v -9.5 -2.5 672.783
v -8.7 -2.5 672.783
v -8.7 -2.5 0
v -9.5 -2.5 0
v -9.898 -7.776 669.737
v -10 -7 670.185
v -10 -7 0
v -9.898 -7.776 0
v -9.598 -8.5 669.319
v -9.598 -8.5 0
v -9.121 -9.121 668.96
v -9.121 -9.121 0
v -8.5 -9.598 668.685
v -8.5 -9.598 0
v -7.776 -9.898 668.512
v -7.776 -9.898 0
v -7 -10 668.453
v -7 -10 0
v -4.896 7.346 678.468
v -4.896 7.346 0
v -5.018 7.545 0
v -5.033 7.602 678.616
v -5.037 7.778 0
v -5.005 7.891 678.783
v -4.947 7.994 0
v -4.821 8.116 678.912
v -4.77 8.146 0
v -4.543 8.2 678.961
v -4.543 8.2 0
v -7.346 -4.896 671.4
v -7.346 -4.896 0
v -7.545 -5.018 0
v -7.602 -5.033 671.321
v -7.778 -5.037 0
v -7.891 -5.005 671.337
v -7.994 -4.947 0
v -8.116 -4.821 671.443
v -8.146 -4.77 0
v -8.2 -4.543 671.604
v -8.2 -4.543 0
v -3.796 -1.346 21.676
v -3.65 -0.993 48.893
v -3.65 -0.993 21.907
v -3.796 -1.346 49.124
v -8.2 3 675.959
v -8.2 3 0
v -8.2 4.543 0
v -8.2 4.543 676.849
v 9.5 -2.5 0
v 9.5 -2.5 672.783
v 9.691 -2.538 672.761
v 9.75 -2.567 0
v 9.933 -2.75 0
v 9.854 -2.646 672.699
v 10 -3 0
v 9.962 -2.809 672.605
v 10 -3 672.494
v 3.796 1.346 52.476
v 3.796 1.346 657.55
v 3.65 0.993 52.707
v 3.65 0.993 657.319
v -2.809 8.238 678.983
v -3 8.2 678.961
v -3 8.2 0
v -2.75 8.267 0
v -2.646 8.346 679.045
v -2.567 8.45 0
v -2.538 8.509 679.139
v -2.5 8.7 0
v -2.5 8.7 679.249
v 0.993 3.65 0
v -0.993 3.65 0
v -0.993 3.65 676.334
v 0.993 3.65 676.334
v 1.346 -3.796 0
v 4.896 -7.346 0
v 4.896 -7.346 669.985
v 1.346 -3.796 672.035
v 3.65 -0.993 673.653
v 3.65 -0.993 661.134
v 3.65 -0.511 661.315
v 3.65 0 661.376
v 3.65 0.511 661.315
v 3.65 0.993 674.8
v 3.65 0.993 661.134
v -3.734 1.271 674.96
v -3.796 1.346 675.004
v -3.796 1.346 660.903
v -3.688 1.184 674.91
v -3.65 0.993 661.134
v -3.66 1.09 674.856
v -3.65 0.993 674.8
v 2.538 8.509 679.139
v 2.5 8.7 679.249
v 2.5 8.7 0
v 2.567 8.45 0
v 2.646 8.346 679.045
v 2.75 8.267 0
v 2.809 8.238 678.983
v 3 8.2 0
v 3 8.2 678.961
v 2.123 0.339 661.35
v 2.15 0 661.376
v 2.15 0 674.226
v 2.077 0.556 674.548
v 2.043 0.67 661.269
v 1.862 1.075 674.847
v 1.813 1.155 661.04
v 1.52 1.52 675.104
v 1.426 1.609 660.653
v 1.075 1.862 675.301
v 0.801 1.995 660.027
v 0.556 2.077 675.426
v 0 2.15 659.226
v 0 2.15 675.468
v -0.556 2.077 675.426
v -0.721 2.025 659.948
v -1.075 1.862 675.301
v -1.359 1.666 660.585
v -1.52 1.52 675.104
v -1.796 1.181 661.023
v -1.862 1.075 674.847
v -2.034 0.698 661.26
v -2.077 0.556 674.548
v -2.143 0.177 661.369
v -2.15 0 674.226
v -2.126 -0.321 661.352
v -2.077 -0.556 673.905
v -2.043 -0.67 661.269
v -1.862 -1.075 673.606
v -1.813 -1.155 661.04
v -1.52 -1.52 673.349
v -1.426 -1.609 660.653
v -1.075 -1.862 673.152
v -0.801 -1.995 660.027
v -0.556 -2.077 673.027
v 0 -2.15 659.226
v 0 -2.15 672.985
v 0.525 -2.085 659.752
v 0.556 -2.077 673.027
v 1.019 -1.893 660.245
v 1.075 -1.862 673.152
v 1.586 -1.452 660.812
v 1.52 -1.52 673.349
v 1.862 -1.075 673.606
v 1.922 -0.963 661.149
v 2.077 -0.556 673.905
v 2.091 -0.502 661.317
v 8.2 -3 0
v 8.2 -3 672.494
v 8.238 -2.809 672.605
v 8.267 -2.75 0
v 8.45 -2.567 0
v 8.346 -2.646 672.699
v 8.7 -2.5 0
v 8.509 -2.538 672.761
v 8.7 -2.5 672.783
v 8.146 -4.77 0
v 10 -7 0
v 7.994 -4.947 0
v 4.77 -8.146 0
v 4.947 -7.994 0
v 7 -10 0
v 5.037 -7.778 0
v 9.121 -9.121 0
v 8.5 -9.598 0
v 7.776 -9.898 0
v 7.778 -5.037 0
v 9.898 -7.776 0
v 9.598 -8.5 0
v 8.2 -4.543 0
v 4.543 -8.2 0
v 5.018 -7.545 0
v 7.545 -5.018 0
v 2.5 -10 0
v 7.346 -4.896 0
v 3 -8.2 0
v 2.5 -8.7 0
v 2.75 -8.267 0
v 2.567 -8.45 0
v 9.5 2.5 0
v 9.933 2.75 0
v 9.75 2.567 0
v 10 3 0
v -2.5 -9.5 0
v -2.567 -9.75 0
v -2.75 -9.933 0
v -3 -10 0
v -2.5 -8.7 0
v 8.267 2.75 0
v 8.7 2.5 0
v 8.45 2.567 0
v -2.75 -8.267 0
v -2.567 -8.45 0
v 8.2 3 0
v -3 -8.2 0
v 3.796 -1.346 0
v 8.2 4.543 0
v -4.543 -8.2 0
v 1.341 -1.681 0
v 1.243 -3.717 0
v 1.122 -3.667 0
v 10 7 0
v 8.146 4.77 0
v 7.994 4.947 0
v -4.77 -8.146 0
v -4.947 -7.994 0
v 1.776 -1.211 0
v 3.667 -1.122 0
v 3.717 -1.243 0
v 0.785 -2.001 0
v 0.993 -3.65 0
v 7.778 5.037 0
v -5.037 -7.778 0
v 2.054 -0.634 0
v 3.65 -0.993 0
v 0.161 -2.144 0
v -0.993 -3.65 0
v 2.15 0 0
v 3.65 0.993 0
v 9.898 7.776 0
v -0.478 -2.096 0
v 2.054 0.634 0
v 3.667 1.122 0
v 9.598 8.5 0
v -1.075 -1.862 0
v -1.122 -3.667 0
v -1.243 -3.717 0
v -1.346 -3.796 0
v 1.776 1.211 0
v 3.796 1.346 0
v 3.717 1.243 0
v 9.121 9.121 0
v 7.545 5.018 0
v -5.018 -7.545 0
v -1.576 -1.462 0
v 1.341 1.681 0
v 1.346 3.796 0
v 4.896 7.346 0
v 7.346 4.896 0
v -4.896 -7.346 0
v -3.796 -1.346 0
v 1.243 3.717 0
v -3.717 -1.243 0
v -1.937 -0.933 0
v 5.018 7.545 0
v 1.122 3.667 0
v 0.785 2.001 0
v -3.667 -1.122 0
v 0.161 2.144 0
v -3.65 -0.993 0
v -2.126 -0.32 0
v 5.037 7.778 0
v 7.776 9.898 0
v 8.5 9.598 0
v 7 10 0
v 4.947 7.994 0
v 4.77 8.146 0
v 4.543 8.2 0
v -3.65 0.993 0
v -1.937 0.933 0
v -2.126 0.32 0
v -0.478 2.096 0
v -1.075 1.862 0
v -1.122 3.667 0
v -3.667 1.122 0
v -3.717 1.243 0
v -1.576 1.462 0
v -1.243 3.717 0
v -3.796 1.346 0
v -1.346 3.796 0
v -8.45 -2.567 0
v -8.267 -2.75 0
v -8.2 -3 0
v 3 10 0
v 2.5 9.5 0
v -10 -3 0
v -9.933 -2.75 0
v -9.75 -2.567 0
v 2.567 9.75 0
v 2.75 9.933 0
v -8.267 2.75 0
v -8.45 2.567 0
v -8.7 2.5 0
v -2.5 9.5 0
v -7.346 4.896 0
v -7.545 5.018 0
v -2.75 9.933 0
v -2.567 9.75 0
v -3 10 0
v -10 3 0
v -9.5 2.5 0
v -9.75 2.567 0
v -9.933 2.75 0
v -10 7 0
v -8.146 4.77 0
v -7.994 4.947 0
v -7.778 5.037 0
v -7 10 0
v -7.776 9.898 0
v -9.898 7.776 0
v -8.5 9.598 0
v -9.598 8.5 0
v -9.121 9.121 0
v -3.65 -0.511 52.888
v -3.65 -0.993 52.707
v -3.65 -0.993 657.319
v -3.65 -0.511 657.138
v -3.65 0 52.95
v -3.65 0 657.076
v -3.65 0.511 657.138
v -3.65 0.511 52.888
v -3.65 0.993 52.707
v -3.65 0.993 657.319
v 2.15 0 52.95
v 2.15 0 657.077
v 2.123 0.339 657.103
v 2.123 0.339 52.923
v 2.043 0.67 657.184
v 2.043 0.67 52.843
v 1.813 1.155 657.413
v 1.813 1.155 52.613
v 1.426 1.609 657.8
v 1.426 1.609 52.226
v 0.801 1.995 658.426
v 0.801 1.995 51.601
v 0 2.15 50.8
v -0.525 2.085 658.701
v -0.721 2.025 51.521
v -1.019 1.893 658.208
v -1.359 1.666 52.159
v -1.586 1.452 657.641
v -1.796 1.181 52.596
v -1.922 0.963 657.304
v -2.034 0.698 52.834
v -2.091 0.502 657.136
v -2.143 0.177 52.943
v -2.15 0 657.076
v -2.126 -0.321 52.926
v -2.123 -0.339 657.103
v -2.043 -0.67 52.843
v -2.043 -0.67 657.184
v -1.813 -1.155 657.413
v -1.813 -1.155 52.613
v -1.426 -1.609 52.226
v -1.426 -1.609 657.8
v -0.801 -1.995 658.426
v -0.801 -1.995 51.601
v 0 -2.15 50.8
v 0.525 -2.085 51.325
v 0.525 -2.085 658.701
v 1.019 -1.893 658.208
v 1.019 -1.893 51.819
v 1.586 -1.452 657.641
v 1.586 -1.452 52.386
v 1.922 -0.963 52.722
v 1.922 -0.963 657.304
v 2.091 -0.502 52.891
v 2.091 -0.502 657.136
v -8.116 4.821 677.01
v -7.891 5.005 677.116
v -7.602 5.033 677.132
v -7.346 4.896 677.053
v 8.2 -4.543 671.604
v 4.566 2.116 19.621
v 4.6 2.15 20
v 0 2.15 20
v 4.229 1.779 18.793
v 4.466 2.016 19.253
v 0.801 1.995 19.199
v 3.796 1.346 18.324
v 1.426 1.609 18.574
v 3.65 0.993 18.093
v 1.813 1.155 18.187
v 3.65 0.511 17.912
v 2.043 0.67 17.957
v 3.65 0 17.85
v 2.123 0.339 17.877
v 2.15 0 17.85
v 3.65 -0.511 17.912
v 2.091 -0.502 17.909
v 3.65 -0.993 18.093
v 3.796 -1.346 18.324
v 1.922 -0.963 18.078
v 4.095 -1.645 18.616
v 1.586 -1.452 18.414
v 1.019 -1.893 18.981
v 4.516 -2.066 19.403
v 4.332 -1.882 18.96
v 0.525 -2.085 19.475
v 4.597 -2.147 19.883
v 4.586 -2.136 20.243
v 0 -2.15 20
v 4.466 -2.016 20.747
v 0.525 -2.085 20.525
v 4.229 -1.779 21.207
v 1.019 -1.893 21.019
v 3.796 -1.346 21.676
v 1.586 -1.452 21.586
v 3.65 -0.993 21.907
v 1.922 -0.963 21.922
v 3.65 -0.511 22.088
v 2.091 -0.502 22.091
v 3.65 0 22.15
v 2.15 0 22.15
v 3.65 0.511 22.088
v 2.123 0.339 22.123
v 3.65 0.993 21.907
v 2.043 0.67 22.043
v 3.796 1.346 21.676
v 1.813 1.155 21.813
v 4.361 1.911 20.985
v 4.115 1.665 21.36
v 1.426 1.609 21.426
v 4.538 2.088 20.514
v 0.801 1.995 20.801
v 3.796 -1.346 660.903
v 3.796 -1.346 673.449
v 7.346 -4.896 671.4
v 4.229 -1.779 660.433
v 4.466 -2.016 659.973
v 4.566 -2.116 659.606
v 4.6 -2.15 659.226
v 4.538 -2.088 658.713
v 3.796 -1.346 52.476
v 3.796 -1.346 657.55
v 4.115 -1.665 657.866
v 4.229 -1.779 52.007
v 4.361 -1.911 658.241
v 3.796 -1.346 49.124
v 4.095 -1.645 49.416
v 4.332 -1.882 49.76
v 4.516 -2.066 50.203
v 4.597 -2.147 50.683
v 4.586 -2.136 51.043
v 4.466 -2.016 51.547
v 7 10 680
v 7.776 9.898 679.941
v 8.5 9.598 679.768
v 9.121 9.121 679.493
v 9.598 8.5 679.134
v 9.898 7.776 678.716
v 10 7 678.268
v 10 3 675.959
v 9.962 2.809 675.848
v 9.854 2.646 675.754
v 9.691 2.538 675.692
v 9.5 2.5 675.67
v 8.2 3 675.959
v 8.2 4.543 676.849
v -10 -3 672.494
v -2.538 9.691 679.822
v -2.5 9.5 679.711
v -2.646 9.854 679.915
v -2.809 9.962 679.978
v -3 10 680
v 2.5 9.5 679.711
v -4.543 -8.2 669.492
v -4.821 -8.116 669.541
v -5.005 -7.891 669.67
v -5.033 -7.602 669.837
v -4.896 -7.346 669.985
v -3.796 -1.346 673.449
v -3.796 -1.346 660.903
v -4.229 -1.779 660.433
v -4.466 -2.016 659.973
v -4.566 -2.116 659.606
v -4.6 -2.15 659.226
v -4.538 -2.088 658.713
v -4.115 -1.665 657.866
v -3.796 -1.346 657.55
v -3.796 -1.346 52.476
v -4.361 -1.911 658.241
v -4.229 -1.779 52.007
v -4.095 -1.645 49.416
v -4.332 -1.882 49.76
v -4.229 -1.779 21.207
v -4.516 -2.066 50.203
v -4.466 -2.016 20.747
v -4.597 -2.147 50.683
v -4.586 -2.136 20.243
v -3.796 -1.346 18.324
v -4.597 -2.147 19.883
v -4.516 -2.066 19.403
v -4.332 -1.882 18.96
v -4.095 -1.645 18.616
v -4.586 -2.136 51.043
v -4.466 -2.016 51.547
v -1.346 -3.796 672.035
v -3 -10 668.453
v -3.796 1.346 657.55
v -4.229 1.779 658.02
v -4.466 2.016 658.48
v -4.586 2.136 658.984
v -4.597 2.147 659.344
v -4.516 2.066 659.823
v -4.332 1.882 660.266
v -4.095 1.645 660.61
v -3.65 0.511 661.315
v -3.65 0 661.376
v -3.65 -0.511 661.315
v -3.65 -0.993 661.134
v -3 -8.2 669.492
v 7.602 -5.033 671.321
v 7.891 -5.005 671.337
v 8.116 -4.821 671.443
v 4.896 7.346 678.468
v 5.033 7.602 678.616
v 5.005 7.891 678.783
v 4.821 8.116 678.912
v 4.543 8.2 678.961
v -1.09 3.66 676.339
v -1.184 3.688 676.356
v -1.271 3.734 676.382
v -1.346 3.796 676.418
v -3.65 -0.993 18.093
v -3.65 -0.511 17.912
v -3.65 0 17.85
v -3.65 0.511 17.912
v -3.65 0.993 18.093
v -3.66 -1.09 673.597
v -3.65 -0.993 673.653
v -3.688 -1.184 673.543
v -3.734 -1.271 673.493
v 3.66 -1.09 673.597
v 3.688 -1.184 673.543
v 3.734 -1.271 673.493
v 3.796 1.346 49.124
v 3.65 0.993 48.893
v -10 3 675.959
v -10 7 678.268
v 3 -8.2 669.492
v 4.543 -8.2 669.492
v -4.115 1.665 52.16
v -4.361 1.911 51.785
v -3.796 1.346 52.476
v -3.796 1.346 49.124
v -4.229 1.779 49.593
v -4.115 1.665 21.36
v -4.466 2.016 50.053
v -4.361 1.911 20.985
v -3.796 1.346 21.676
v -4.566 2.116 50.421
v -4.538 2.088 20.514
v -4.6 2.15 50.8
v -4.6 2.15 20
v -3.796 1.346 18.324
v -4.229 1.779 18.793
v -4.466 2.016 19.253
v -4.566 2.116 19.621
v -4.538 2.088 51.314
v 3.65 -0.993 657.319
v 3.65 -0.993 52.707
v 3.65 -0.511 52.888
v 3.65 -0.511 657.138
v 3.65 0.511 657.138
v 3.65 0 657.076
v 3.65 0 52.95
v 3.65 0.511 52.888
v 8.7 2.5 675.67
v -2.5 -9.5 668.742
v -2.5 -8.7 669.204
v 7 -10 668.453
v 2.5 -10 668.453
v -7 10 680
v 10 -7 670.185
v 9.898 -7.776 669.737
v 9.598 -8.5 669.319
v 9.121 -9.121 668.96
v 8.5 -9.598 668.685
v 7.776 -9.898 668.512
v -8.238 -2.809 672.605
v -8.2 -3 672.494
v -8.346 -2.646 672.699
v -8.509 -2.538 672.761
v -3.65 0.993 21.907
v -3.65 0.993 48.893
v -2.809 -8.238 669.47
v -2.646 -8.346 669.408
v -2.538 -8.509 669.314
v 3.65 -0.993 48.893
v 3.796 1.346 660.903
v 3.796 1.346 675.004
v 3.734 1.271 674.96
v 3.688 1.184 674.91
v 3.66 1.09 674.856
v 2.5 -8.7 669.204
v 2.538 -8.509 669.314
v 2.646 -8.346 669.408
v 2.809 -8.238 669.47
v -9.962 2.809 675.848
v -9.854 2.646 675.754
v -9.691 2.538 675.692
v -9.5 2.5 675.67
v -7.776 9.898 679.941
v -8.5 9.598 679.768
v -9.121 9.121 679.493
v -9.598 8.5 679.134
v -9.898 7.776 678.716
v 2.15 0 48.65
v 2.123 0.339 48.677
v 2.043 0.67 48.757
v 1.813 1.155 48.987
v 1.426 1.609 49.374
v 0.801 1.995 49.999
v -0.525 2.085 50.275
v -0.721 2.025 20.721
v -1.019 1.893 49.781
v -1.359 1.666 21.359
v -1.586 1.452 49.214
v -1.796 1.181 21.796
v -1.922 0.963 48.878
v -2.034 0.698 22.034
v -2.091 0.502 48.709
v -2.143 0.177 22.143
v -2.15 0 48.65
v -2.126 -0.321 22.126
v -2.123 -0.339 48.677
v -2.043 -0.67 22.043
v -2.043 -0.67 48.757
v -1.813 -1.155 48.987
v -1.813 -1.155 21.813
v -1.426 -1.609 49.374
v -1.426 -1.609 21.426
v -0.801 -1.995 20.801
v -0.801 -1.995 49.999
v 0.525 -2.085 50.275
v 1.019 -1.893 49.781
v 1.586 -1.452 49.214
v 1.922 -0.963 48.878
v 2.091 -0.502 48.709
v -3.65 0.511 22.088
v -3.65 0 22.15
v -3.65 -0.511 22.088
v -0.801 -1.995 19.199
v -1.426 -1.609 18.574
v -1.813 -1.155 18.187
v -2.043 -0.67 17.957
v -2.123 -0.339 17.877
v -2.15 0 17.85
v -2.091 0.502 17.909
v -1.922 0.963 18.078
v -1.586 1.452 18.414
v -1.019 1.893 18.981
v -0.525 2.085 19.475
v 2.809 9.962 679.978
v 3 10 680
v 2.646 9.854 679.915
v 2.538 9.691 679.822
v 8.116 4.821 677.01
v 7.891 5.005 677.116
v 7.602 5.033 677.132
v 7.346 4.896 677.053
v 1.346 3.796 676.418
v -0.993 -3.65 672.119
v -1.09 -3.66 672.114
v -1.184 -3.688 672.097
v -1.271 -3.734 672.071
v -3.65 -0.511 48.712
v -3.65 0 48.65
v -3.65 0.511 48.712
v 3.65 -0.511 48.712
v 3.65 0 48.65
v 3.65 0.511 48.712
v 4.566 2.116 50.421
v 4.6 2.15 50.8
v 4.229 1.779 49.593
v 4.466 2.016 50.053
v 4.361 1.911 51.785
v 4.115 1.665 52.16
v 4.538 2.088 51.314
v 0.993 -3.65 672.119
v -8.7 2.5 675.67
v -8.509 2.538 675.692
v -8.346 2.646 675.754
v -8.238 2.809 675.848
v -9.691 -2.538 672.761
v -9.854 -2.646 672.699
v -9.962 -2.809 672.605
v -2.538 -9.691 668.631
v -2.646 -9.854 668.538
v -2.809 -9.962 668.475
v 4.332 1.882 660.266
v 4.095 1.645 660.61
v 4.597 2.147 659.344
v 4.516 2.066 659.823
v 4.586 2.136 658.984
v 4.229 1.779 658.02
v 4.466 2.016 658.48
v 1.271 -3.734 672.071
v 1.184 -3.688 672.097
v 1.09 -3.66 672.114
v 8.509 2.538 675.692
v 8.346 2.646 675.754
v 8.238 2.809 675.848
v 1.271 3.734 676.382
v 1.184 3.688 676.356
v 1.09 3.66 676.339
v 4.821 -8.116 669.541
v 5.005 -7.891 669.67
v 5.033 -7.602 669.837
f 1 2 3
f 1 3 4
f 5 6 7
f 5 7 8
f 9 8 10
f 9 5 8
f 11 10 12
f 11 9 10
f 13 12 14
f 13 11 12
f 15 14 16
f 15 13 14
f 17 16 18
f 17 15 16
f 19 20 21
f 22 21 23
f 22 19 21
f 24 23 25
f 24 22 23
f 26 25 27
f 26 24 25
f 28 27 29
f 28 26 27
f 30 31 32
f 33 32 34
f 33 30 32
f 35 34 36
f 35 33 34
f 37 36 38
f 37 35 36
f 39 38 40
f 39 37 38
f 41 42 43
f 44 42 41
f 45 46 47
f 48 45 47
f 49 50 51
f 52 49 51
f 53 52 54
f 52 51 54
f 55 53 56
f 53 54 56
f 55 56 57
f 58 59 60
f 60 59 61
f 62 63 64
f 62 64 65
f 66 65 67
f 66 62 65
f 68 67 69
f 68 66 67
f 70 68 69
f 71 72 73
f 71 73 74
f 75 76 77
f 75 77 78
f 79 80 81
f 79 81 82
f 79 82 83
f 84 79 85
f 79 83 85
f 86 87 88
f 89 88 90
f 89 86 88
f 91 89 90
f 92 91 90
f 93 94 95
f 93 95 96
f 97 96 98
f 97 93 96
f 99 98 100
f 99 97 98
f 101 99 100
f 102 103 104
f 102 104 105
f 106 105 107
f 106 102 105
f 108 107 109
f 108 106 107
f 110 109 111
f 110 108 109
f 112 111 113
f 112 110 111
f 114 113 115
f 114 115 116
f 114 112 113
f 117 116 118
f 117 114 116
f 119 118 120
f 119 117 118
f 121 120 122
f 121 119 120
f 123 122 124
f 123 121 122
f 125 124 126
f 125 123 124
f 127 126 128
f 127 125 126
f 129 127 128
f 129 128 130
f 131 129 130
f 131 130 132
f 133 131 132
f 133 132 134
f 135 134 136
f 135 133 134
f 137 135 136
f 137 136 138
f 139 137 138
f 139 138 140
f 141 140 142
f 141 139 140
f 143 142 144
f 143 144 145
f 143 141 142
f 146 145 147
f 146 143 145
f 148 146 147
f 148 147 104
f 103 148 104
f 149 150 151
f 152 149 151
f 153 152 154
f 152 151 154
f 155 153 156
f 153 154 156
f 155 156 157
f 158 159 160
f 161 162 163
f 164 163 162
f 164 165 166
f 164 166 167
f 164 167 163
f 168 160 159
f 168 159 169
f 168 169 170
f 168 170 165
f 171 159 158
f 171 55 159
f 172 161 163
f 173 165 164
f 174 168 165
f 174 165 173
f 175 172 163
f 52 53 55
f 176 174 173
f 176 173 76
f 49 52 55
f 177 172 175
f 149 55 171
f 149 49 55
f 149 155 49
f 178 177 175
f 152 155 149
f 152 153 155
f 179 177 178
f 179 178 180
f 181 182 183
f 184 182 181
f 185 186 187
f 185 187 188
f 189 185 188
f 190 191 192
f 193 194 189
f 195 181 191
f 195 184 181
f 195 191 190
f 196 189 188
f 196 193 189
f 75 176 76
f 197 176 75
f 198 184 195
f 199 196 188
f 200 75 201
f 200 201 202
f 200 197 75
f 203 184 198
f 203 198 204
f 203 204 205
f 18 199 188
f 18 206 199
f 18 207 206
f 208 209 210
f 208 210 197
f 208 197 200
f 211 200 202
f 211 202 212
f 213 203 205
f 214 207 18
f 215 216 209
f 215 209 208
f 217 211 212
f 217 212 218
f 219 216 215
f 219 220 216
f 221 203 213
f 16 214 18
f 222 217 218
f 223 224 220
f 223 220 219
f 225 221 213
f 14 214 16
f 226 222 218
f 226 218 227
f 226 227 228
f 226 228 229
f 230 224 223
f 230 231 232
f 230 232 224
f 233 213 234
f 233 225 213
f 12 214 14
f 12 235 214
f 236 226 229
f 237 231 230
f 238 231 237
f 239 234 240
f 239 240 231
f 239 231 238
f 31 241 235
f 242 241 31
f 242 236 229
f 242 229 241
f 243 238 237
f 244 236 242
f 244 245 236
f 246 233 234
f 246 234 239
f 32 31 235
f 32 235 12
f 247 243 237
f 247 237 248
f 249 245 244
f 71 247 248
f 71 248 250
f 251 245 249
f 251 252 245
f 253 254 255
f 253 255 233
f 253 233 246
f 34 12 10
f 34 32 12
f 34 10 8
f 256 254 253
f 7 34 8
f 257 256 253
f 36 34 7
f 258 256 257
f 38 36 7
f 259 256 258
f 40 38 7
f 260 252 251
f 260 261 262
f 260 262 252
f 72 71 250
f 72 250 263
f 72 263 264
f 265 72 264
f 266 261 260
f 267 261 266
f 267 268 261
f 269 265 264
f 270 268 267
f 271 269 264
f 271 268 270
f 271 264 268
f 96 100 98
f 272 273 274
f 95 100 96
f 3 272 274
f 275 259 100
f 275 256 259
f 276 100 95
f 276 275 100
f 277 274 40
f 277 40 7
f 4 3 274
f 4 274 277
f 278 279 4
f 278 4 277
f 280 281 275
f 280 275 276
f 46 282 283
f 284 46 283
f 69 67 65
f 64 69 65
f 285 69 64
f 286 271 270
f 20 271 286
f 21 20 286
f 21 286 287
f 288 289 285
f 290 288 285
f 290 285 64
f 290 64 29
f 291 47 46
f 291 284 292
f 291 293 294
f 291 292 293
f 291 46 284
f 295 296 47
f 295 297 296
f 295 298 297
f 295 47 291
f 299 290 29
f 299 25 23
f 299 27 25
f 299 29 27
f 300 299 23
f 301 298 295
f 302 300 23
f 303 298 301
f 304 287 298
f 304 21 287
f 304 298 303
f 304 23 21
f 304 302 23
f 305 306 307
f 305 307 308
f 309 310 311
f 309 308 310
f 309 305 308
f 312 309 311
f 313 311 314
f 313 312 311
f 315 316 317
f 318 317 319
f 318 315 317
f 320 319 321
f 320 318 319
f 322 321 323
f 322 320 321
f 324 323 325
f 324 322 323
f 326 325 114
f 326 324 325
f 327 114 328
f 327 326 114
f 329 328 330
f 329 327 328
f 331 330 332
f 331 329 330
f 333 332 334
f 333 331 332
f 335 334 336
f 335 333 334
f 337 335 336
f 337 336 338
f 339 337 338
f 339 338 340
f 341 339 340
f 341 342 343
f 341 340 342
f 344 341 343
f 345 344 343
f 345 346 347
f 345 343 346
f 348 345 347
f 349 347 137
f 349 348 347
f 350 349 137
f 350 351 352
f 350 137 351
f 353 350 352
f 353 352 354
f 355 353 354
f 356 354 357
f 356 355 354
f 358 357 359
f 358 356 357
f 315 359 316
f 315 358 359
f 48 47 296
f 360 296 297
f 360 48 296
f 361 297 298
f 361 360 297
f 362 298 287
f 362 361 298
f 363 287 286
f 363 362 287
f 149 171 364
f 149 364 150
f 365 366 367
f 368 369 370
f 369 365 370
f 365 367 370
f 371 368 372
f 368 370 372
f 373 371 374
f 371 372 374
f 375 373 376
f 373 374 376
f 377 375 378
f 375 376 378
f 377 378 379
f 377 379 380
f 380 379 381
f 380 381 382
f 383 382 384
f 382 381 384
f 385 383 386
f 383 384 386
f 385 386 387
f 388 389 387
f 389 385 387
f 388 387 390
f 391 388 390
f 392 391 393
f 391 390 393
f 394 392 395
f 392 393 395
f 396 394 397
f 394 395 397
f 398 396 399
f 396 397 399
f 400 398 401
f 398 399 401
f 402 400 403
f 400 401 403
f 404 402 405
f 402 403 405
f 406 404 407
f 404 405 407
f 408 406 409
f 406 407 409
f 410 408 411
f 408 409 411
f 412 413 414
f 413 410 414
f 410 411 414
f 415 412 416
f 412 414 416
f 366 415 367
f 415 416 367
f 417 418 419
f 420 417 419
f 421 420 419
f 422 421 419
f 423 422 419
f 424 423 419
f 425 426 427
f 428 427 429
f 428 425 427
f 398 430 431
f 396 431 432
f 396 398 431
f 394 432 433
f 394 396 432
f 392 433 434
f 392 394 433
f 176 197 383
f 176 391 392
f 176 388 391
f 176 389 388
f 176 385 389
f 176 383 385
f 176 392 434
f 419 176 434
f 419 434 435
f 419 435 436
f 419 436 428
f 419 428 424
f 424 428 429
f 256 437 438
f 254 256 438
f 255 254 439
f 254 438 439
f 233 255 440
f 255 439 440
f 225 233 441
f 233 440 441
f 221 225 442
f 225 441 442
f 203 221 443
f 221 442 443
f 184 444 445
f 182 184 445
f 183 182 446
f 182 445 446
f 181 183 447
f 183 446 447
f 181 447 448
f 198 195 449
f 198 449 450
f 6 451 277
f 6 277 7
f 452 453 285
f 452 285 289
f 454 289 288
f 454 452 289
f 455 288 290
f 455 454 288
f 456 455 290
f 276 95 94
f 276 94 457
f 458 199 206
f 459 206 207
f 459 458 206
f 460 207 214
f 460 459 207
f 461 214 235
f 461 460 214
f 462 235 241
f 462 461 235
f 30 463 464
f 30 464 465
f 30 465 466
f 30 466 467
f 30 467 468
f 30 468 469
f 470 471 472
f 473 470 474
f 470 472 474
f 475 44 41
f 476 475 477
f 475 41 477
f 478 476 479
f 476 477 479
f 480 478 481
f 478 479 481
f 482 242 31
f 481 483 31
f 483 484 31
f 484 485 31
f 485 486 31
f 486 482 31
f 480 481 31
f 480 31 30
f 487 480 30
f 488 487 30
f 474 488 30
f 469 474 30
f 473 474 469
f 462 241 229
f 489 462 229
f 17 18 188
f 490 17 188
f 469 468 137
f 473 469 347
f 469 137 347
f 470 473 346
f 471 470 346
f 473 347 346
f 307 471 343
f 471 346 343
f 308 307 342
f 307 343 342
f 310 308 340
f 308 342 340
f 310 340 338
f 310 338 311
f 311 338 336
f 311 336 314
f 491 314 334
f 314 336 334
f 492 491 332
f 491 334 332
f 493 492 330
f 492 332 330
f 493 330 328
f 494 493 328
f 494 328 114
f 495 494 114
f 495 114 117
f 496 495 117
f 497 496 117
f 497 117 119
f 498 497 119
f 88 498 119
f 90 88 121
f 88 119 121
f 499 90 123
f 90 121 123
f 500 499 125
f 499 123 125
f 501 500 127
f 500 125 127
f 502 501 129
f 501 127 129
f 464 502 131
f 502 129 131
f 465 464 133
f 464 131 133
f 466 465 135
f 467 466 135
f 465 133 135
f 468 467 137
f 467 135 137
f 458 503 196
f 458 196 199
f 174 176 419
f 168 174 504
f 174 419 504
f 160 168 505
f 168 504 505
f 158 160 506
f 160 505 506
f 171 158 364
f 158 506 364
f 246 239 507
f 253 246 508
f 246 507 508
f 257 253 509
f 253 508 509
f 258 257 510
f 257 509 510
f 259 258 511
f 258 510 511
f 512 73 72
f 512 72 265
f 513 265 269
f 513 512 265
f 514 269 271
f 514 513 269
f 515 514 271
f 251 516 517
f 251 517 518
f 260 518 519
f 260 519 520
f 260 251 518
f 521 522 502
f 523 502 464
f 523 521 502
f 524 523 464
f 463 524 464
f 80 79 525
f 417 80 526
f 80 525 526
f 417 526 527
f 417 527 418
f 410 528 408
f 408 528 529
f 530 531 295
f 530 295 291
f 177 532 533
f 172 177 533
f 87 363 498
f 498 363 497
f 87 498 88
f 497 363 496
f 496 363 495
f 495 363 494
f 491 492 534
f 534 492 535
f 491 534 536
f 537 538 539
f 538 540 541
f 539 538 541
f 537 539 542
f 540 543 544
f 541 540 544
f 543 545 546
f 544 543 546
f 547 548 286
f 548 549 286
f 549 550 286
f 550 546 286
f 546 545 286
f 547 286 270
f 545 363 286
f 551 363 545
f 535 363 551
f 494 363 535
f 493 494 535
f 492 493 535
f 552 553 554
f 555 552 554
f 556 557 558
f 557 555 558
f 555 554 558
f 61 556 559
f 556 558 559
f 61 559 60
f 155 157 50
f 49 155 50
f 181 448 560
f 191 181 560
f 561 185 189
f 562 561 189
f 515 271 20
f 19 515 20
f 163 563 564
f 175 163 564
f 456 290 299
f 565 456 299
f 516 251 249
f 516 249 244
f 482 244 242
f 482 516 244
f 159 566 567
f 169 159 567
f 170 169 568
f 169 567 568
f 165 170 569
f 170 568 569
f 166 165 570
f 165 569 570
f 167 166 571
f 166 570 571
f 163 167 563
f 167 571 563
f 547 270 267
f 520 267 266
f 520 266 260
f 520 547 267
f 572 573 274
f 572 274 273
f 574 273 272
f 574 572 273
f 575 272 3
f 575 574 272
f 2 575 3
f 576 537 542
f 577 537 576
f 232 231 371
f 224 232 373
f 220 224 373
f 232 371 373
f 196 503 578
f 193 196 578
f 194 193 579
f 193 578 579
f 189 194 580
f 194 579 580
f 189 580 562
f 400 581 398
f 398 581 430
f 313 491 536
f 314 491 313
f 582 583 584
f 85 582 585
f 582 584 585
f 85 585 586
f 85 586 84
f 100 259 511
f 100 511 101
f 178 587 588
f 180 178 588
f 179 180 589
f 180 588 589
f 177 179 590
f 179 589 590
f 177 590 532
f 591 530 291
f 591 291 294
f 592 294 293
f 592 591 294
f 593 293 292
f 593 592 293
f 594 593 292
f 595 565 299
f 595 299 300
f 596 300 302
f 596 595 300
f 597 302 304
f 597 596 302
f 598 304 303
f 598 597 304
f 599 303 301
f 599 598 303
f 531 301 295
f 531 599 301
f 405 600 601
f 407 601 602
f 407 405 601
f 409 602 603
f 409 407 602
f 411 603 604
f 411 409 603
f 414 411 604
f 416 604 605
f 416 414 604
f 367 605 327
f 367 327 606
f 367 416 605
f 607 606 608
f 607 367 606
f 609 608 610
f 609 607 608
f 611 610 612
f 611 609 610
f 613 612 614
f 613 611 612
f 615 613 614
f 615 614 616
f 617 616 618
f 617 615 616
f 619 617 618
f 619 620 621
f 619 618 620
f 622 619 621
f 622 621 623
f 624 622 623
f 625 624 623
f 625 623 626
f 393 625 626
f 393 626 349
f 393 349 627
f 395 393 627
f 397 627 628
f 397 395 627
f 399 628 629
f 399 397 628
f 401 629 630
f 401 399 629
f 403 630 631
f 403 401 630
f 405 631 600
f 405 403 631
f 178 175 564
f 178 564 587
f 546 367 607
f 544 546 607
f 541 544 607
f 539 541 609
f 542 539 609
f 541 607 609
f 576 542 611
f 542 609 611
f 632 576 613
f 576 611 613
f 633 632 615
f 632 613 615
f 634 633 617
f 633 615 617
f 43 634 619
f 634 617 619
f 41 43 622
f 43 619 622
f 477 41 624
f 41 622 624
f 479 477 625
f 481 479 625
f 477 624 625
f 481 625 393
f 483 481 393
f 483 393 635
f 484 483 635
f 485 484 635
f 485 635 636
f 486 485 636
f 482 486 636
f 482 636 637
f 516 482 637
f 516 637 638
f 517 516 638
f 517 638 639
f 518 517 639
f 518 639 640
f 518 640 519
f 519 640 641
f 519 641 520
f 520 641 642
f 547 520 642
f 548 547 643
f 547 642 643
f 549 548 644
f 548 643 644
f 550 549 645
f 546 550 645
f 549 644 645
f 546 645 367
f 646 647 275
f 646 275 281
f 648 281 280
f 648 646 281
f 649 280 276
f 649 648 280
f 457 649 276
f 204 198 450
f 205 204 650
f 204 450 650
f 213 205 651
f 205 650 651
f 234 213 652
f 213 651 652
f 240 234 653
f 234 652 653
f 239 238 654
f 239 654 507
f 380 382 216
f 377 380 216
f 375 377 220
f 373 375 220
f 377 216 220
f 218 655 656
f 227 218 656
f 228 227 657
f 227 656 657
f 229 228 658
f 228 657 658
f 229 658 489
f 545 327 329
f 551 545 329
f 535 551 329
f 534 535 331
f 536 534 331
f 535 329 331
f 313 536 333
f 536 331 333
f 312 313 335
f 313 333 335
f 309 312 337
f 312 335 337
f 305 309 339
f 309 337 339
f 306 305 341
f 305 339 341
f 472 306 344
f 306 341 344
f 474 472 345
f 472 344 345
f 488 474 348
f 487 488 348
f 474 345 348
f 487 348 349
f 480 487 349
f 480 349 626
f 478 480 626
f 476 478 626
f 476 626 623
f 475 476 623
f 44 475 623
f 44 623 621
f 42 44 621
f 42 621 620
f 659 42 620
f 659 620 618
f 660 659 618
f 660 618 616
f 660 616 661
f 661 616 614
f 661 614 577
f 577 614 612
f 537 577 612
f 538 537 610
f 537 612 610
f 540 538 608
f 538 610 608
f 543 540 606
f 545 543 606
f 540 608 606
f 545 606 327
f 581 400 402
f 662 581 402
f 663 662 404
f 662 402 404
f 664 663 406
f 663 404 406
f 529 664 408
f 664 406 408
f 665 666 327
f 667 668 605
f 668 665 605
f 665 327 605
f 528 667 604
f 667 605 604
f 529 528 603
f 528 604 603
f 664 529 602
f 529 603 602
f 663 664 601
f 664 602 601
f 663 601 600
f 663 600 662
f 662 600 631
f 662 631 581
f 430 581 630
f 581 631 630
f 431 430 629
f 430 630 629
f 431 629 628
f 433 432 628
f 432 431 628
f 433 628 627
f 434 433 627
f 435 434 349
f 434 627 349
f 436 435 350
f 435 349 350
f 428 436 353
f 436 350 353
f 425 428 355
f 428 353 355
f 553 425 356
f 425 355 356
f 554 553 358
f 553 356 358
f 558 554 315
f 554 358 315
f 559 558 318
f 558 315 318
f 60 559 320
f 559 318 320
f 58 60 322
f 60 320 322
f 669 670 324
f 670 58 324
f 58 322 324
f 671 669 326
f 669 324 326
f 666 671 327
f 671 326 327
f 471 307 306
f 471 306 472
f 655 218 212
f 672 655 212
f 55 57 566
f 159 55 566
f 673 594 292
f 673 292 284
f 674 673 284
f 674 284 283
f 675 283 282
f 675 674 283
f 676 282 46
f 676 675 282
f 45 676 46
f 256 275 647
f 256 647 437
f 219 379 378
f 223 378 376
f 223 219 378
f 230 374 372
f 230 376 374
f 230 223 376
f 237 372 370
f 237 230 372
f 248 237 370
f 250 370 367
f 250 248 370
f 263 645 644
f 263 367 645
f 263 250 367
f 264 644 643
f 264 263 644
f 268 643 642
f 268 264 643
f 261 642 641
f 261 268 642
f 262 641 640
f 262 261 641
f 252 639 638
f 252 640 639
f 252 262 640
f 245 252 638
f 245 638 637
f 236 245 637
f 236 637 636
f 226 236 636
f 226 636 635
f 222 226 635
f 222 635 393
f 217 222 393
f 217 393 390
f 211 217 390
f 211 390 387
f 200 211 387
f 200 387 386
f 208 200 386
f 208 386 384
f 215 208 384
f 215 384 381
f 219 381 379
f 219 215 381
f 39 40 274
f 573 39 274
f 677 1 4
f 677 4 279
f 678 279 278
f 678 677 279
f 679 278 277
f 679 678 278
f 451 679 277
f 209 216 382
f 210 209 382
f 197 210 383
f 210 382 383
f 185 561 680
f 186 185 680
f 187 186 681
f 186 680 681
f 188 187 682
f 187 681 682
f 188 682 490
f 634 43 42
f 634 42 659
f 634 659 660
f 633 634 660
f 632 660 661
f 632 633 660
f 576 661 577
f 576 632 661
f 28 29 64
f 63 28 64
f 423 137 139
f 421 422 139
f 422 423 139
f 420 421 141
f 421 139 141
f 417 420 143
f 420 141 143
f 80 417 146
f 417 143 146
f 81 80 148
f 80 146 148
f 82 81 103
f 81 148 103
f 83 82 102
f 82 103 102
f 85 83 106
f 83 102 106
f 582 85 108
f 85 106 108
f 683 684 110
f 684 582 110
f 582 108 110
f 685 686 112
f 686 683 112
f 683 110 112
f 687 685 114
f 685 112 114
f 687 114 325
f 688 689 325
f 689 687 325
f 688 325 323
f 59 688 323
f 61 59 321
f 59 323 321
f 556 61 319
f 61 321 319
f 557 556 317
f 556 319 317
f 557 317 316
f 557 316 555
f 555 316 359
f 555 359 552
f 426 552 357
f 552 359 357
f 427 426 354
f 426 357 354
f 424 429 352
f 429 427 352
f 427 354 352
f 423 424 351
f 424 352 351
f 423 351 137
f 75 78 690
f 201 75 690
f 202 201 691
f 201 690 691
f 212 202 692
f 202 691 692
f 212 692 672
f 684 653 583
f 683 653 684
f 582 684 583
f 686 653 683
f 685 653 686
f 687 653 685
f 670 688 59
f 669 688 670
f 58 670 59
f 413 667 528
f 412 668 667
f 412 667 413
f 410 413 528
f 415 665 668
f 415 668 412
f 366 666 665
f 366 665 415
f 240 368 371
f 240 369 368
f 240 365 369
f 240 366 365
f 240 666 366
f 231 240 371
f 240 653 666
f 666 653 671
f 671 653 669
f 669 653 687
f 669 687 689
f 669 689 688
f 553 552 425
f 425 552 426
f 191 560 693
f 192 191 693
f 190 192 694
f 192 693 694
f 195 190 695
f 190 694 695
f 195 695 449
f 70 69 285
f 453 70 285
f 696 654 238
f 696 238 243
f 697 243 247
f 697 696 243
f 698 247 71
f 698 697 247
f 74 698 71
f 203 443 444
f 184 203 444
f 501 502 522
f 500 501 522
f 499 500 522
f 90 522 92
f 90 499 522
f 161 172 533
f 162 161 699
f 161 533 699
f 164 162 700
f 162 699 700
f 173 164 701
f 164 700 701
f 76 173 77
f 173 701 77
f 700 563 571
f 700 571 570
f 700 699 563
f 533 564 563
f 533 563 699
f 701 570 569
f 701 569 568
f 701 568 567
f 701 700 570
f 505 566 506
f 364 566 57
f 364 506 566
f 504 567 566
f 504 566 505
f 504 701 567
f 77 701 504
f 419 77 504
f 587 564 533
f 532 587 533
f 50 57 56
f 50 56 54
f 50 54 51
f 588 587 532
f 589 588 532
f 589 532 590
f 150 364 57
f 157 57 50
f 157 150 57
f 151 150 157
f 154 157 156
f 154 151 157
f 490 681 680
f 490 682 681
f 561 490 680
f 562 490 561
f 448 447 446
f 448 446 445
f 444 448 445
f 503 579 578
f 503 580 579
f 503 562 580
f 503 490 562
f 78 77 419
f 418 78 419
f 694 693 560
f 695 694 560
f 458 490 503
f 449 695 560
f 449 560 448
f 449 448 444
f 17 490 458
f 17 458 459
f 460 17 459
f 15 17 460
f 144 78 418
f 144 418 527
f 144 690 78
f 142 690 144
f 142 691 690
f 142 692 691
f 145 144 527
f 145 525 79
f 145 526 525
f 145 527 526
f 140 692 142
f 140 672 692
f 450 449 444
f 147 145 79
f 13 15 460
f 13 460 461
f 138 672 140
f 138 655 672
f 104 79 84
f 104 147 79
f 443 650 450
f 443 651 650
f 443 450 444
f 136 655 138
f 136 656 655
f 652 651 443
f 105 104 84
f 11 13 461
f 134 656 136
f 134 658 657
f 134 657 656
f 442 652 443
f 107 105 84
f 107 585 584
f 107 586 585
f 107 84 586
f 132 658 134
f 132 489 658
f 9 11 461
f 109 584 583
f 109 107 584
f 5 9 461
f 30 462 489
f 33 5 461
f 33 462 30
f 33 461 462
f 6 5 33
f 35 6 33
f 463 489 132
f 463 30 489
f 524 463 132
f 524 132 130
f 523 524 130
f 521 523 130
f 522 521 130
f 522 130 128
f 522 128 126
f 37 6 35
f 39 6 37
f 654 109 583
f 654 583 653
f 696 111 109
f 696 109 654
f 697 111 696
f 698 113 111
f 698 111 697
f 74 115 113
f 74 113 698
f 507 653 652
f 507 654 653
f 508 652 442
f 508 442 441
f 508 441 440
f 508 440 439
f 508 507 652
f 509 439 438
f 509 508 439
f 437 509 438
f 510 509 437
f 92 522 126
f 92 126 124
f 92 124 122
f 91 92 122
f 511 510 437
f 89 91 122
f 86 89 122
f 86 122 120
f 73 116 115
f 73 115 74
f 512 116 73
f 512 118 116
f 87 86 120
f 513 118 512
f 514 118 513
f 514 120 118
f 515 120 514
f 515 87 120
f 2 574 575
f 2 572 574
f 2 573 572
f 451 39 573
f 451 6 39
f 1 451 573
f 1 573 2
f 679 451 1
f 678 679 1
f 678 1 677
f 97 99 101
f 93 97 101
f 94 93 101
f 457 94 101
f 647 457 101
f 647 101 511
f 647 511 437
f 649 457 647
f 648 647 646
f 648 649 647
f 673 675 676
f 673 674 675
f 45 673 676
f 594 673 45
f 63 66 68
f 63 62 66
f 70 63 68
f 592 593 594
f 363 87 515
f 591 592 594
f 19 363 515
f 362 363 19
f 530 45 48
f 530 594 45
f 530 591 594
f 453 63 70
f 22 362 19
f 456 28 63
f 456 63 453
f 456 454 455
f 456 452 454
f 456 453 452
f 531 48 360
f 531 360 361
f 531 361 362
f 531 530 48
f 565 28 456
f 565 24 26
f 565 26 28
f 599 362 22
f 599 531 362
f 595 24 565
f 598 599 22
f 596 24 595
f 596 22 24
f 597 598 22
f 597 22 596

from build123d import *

# Parameters (mm, degrees)
SKETCH1_W           = 7.3
SKETCH1_H           = 7.3
SKETCH1_R           = 2.15
BOSS_EXTRUDE1_DEPTH = 680
BOSS_EXTRUDE2_DEPTH = 680
FILLET4_R           = 3
FILLET5_R           = 0.5
FILLET6_R           = 0.5
FILLET7_R           = 0.5
CUT_EXTRUDE1_DEPTH  = 681.147042925
CUT_EXTRUDE5_DEPTH  = 681.147042925
SKETCH5_R           = 2.15
CUT_EXTRUDE6_DEPTH  = 681.210498669
SKETCH6_R           = 2.15
CUT_EXTRUDE7_DEPTH  = 681.210498669
SKETCH9_R           = 2.15
CUT_EXTRUDE10_DEPTH = 681.210498669
SKETCH10_R          = 2.15
CUT_EXTRUDE11_DEPTH = 681.210498669
SKETCH13_R          = 2.15
CUT_EXTRUDE14_DEPTH = 681.210498669
SKETCH14_R          = 2.15
CUT_EXTRUDE15_DEPTH = 681.210498669


with BuildPart() as part:
    # Sketch1 → Boss-Extrude1 (new body)
    with BuildSketch(Plane.XY):
        Rectangle(SKETCH1_W, SKETCH1_H)
        Circle(SKETCH1_R, mode=Mode.SUBTRACT)
    extrude(amount=BOSS_EXTRUDE1_DEPTH)

    # Sketch2 → Boss-Extrude2 (add)
    with BuildSketch(Plane.XY):
        Polygon((3.65, 3.65), (1.2, 3.65), (5.750000001, 8.200000001), (2.500000001, 8.200000001), (2.500000001, 10.000000001), (10.000000001, 10.000000001), (10.000000001, 2.500000001), (8.200000001, 2.500000001), (8.200000001, 5.750000001), (3.65, 1.2), align=None)
        Polygon((-3.65, 3.65), (-1.2, 3.65), (-5.750000001, 8.200000001), (-2.500000001, 8.200000001), (-2.500000001, 10.000000001), (-10.000000001, 10.000000001), (-10.000000001, 2.500000001), (-8.200000001, 2.500000001), (-8.200000001, 5.750000001), (-3.65, 1.2), align=None)
        Polygon((-3.65, -3.65), (-3.65, -1.2), (-8.200000001, -5.750000001), (-8.200000001, -2.500000001), (-10.000000001, -2.500000001), (-10.000000001, -10.000000001), (-2.500000001, -10.000000001), (-2.500000001, -8.200000001), (-5.750000001, -8.200000001), (-1.2, -3.65), align=None)
        Polygon((3.65, -3.65), (3.65, -1.2), (8.200000001, -5.750000001), (8.200000001, -2.500000001), (10.000000001, -2.500000001), (10.000000001, -10.000000001), (2.500000001, -10.000000001), (2.500000001, -8.200000001), (5.750000001, -8.200000001), (1.2, -3.65), align=None)
    extrude(amount=BOSS_EXTRUDE2_DEPTH)

    # Fillet4
    fillet4_edges = [part.edges().sort_by_distance(p)[0] for p in [
        (10.000000001, 10.000000001, 340),
        (-10.000000001, 10.000000001, 340),
        (-10.000000001, -10.000000001, 340),
        (10.000000001, -10.000000001, 340),
    ]]
    fillet(fillet4_edges, radius=FILLET4_R)

    # Fillet5
    fillet5_edges = [part.edges().sort_by_distance(p)[0] for p in [
        (8.200000001, 2.500000001, 340),
        (10.000000001, 2.500000001, 340),
        (2.500000001, 10.000000001, 340),
        (2.500000001, 8.200000001, 340),
        (-2.500000001, 8.200000001, 340),
        (-2.500000001, 10.000000001, 340),
        (-10.000000001, 2.500000001, 340),
        (-8.200000001, 2.500000001, 340),
        (-8.200000001, -2.500000001, 340),
        (-10.000000001, -2.500000001, 340),
        (-2.500000001, -10.000000001, 340),
        (-2.500000001, -8.200000001, 340),
        (2.500000001, -8.200000001, 340),
        (10.000000001, -2.500000001, 340),
        (8.200000001, -2.500000001, 340),
    ]]
    fillet(fillet5_edges, radius=FILLET5_R)

    # Fillet6
    fillet6_edges = [part.edges().sort_by_distance(p)[0] for p in [
        (3.65, 1.2, 340),
        (1.2, 3.65, 340),
        (-3.65, 1.2, 340),
        (-1.2, 3.65, 340),
        (-1.2, -3.65, 340),
        (-3.65, -1.2, 340),
        (1.2, -3.65, 340),
        (3.65, -1.2, 340),
    ]]
    fillet(fillet6_edges, radius=FILLET6_R)

    # Fillet7
    fillet7_edges = [part.edges().sort_by_distance(p)[0] for p in [
        (8.200000001, 5.750000001, 340),
        (5.750000001, 8.200000001, 340),
        (-5.750000001, 8.200000001, 340),
        (-8.200000001, 5.750000001, 340),
        (-8.200000001, -5.750000001, 340),
        (-5.750000001, -8.200000001, 340),
        (5.750000001, -8.200000001, 340),
        (8.200000001, -5.750000001, 340),
    ]]
    fillet(fillet7_edges, radius=FILLET7_R)

    # Sketch3 → Cut-Extrude1 (cut, through all)
    with BuildSketch(Plane(origin=(0, 0, 0), x_dir=(0, 0, -1), z_dir=(1, 0, 0))):
        Polygon((-680, 10.000000001), (-680, -10.000000001), (-668.453, -10.000000001), align=None)
    extrude(amount=-CUT_EXTRUDE1_DEPTH, mode=Mode.SUBTRACT)

    # Sketch4 → Cut-Extrude5 (cut, through all)
    with BuildSketch(Plane(origin=(0, 0, 0), x_dir=(0, 0, -1), z_dir=(1, 0, 0))):
        Polygon((-680, 10.000000001), (-680, -10.000000001), (-668.453, -10.000000001), align=None)
    extrude(amount=CUT_EXTRUDE5_DEPTH, mode=Mode.SUBTRACT)

    # Sketch5 → Cut-Extrude6 (cut, through all)
    with BuildSketch(Plane.ZY.offset(3.65)):
        with Locations(Location((659.2265, 0, 0), (0, 0, 270))):
            Circle(SKETCH5_R)
    extrude(amount=-CUT_EXTRUDE6_DEPTH, mode=Mode.SUBTRACT)

    # Sketch6 → Cut-Extrude7 (cut, through all)
    with BuildSketch(Plane(origin=(3.65, 0, 0), x_dir=(0, 0, -1), z_dir=(1, 0, 0))):
        with Locations(Location((-659.2265, 0, 0), (0, 0, 270))):
            Circle(SKETCH6_R)
    extrude(amount=-CUT_EXTRUDE7_DEPTH, mode=Mode.SUBTRACT)

    # Sketch9 → Cut-Extrude10 (cut, through all)
    with BuildSketch(Plane(origin=(3.65, 0, 0), x_dir=(0, 0, -1), z_dir=(1, 0, 0))):
        with Locations(Location((-50.8, 0, 0), (0, 0, 90))):
            Circle(SKETCH9_R)
    extrude(amount=-CUT_EXTRUDE10_DEPTH, mode=Mode.SUBTRACT)

    # Sketch10 → Cut-Extrude11 (cut, through all)
    with BuildSketch(Plane.ZY.offset(3.65)):
        with Locations(Location((50.8, 0, 0), (0, 0, 90))):
            Circle(SKETCH10_R)
    extrude(amount=-CUT_EXTRUDE11_DEPTH, mode=Mode.SUBTRACT)

    # Sketch13 → Cut-Extrude14 (cut, through all)
    with BuildSketch(Plane(origin=(3.65, 0, 0), x_dir=(0, 0, -1), z_dir=(1, 0, 0))):
        with Locations(Location((-20, 0, 0), (0, 0, 90))):
            Circle(SKETCH13_R)
    extrude(amount=-CUT_EXTRUDE14_DEPTH, mode=Mode.SUBTRACT)

    # Sketch14 → Cut-Extrude15 (cut, through all)
    with BuildSketch(Plane.ZY.offset(3.65)):
        with Locations(Location((20, 0, 0), (0, 0, 90))):
            Circle(SKETCH14_R)
    extrude(amount=-CUT_EXTRUDE15_DEPTH, mode=Mode.SUBTRACT)


solid = part.part
